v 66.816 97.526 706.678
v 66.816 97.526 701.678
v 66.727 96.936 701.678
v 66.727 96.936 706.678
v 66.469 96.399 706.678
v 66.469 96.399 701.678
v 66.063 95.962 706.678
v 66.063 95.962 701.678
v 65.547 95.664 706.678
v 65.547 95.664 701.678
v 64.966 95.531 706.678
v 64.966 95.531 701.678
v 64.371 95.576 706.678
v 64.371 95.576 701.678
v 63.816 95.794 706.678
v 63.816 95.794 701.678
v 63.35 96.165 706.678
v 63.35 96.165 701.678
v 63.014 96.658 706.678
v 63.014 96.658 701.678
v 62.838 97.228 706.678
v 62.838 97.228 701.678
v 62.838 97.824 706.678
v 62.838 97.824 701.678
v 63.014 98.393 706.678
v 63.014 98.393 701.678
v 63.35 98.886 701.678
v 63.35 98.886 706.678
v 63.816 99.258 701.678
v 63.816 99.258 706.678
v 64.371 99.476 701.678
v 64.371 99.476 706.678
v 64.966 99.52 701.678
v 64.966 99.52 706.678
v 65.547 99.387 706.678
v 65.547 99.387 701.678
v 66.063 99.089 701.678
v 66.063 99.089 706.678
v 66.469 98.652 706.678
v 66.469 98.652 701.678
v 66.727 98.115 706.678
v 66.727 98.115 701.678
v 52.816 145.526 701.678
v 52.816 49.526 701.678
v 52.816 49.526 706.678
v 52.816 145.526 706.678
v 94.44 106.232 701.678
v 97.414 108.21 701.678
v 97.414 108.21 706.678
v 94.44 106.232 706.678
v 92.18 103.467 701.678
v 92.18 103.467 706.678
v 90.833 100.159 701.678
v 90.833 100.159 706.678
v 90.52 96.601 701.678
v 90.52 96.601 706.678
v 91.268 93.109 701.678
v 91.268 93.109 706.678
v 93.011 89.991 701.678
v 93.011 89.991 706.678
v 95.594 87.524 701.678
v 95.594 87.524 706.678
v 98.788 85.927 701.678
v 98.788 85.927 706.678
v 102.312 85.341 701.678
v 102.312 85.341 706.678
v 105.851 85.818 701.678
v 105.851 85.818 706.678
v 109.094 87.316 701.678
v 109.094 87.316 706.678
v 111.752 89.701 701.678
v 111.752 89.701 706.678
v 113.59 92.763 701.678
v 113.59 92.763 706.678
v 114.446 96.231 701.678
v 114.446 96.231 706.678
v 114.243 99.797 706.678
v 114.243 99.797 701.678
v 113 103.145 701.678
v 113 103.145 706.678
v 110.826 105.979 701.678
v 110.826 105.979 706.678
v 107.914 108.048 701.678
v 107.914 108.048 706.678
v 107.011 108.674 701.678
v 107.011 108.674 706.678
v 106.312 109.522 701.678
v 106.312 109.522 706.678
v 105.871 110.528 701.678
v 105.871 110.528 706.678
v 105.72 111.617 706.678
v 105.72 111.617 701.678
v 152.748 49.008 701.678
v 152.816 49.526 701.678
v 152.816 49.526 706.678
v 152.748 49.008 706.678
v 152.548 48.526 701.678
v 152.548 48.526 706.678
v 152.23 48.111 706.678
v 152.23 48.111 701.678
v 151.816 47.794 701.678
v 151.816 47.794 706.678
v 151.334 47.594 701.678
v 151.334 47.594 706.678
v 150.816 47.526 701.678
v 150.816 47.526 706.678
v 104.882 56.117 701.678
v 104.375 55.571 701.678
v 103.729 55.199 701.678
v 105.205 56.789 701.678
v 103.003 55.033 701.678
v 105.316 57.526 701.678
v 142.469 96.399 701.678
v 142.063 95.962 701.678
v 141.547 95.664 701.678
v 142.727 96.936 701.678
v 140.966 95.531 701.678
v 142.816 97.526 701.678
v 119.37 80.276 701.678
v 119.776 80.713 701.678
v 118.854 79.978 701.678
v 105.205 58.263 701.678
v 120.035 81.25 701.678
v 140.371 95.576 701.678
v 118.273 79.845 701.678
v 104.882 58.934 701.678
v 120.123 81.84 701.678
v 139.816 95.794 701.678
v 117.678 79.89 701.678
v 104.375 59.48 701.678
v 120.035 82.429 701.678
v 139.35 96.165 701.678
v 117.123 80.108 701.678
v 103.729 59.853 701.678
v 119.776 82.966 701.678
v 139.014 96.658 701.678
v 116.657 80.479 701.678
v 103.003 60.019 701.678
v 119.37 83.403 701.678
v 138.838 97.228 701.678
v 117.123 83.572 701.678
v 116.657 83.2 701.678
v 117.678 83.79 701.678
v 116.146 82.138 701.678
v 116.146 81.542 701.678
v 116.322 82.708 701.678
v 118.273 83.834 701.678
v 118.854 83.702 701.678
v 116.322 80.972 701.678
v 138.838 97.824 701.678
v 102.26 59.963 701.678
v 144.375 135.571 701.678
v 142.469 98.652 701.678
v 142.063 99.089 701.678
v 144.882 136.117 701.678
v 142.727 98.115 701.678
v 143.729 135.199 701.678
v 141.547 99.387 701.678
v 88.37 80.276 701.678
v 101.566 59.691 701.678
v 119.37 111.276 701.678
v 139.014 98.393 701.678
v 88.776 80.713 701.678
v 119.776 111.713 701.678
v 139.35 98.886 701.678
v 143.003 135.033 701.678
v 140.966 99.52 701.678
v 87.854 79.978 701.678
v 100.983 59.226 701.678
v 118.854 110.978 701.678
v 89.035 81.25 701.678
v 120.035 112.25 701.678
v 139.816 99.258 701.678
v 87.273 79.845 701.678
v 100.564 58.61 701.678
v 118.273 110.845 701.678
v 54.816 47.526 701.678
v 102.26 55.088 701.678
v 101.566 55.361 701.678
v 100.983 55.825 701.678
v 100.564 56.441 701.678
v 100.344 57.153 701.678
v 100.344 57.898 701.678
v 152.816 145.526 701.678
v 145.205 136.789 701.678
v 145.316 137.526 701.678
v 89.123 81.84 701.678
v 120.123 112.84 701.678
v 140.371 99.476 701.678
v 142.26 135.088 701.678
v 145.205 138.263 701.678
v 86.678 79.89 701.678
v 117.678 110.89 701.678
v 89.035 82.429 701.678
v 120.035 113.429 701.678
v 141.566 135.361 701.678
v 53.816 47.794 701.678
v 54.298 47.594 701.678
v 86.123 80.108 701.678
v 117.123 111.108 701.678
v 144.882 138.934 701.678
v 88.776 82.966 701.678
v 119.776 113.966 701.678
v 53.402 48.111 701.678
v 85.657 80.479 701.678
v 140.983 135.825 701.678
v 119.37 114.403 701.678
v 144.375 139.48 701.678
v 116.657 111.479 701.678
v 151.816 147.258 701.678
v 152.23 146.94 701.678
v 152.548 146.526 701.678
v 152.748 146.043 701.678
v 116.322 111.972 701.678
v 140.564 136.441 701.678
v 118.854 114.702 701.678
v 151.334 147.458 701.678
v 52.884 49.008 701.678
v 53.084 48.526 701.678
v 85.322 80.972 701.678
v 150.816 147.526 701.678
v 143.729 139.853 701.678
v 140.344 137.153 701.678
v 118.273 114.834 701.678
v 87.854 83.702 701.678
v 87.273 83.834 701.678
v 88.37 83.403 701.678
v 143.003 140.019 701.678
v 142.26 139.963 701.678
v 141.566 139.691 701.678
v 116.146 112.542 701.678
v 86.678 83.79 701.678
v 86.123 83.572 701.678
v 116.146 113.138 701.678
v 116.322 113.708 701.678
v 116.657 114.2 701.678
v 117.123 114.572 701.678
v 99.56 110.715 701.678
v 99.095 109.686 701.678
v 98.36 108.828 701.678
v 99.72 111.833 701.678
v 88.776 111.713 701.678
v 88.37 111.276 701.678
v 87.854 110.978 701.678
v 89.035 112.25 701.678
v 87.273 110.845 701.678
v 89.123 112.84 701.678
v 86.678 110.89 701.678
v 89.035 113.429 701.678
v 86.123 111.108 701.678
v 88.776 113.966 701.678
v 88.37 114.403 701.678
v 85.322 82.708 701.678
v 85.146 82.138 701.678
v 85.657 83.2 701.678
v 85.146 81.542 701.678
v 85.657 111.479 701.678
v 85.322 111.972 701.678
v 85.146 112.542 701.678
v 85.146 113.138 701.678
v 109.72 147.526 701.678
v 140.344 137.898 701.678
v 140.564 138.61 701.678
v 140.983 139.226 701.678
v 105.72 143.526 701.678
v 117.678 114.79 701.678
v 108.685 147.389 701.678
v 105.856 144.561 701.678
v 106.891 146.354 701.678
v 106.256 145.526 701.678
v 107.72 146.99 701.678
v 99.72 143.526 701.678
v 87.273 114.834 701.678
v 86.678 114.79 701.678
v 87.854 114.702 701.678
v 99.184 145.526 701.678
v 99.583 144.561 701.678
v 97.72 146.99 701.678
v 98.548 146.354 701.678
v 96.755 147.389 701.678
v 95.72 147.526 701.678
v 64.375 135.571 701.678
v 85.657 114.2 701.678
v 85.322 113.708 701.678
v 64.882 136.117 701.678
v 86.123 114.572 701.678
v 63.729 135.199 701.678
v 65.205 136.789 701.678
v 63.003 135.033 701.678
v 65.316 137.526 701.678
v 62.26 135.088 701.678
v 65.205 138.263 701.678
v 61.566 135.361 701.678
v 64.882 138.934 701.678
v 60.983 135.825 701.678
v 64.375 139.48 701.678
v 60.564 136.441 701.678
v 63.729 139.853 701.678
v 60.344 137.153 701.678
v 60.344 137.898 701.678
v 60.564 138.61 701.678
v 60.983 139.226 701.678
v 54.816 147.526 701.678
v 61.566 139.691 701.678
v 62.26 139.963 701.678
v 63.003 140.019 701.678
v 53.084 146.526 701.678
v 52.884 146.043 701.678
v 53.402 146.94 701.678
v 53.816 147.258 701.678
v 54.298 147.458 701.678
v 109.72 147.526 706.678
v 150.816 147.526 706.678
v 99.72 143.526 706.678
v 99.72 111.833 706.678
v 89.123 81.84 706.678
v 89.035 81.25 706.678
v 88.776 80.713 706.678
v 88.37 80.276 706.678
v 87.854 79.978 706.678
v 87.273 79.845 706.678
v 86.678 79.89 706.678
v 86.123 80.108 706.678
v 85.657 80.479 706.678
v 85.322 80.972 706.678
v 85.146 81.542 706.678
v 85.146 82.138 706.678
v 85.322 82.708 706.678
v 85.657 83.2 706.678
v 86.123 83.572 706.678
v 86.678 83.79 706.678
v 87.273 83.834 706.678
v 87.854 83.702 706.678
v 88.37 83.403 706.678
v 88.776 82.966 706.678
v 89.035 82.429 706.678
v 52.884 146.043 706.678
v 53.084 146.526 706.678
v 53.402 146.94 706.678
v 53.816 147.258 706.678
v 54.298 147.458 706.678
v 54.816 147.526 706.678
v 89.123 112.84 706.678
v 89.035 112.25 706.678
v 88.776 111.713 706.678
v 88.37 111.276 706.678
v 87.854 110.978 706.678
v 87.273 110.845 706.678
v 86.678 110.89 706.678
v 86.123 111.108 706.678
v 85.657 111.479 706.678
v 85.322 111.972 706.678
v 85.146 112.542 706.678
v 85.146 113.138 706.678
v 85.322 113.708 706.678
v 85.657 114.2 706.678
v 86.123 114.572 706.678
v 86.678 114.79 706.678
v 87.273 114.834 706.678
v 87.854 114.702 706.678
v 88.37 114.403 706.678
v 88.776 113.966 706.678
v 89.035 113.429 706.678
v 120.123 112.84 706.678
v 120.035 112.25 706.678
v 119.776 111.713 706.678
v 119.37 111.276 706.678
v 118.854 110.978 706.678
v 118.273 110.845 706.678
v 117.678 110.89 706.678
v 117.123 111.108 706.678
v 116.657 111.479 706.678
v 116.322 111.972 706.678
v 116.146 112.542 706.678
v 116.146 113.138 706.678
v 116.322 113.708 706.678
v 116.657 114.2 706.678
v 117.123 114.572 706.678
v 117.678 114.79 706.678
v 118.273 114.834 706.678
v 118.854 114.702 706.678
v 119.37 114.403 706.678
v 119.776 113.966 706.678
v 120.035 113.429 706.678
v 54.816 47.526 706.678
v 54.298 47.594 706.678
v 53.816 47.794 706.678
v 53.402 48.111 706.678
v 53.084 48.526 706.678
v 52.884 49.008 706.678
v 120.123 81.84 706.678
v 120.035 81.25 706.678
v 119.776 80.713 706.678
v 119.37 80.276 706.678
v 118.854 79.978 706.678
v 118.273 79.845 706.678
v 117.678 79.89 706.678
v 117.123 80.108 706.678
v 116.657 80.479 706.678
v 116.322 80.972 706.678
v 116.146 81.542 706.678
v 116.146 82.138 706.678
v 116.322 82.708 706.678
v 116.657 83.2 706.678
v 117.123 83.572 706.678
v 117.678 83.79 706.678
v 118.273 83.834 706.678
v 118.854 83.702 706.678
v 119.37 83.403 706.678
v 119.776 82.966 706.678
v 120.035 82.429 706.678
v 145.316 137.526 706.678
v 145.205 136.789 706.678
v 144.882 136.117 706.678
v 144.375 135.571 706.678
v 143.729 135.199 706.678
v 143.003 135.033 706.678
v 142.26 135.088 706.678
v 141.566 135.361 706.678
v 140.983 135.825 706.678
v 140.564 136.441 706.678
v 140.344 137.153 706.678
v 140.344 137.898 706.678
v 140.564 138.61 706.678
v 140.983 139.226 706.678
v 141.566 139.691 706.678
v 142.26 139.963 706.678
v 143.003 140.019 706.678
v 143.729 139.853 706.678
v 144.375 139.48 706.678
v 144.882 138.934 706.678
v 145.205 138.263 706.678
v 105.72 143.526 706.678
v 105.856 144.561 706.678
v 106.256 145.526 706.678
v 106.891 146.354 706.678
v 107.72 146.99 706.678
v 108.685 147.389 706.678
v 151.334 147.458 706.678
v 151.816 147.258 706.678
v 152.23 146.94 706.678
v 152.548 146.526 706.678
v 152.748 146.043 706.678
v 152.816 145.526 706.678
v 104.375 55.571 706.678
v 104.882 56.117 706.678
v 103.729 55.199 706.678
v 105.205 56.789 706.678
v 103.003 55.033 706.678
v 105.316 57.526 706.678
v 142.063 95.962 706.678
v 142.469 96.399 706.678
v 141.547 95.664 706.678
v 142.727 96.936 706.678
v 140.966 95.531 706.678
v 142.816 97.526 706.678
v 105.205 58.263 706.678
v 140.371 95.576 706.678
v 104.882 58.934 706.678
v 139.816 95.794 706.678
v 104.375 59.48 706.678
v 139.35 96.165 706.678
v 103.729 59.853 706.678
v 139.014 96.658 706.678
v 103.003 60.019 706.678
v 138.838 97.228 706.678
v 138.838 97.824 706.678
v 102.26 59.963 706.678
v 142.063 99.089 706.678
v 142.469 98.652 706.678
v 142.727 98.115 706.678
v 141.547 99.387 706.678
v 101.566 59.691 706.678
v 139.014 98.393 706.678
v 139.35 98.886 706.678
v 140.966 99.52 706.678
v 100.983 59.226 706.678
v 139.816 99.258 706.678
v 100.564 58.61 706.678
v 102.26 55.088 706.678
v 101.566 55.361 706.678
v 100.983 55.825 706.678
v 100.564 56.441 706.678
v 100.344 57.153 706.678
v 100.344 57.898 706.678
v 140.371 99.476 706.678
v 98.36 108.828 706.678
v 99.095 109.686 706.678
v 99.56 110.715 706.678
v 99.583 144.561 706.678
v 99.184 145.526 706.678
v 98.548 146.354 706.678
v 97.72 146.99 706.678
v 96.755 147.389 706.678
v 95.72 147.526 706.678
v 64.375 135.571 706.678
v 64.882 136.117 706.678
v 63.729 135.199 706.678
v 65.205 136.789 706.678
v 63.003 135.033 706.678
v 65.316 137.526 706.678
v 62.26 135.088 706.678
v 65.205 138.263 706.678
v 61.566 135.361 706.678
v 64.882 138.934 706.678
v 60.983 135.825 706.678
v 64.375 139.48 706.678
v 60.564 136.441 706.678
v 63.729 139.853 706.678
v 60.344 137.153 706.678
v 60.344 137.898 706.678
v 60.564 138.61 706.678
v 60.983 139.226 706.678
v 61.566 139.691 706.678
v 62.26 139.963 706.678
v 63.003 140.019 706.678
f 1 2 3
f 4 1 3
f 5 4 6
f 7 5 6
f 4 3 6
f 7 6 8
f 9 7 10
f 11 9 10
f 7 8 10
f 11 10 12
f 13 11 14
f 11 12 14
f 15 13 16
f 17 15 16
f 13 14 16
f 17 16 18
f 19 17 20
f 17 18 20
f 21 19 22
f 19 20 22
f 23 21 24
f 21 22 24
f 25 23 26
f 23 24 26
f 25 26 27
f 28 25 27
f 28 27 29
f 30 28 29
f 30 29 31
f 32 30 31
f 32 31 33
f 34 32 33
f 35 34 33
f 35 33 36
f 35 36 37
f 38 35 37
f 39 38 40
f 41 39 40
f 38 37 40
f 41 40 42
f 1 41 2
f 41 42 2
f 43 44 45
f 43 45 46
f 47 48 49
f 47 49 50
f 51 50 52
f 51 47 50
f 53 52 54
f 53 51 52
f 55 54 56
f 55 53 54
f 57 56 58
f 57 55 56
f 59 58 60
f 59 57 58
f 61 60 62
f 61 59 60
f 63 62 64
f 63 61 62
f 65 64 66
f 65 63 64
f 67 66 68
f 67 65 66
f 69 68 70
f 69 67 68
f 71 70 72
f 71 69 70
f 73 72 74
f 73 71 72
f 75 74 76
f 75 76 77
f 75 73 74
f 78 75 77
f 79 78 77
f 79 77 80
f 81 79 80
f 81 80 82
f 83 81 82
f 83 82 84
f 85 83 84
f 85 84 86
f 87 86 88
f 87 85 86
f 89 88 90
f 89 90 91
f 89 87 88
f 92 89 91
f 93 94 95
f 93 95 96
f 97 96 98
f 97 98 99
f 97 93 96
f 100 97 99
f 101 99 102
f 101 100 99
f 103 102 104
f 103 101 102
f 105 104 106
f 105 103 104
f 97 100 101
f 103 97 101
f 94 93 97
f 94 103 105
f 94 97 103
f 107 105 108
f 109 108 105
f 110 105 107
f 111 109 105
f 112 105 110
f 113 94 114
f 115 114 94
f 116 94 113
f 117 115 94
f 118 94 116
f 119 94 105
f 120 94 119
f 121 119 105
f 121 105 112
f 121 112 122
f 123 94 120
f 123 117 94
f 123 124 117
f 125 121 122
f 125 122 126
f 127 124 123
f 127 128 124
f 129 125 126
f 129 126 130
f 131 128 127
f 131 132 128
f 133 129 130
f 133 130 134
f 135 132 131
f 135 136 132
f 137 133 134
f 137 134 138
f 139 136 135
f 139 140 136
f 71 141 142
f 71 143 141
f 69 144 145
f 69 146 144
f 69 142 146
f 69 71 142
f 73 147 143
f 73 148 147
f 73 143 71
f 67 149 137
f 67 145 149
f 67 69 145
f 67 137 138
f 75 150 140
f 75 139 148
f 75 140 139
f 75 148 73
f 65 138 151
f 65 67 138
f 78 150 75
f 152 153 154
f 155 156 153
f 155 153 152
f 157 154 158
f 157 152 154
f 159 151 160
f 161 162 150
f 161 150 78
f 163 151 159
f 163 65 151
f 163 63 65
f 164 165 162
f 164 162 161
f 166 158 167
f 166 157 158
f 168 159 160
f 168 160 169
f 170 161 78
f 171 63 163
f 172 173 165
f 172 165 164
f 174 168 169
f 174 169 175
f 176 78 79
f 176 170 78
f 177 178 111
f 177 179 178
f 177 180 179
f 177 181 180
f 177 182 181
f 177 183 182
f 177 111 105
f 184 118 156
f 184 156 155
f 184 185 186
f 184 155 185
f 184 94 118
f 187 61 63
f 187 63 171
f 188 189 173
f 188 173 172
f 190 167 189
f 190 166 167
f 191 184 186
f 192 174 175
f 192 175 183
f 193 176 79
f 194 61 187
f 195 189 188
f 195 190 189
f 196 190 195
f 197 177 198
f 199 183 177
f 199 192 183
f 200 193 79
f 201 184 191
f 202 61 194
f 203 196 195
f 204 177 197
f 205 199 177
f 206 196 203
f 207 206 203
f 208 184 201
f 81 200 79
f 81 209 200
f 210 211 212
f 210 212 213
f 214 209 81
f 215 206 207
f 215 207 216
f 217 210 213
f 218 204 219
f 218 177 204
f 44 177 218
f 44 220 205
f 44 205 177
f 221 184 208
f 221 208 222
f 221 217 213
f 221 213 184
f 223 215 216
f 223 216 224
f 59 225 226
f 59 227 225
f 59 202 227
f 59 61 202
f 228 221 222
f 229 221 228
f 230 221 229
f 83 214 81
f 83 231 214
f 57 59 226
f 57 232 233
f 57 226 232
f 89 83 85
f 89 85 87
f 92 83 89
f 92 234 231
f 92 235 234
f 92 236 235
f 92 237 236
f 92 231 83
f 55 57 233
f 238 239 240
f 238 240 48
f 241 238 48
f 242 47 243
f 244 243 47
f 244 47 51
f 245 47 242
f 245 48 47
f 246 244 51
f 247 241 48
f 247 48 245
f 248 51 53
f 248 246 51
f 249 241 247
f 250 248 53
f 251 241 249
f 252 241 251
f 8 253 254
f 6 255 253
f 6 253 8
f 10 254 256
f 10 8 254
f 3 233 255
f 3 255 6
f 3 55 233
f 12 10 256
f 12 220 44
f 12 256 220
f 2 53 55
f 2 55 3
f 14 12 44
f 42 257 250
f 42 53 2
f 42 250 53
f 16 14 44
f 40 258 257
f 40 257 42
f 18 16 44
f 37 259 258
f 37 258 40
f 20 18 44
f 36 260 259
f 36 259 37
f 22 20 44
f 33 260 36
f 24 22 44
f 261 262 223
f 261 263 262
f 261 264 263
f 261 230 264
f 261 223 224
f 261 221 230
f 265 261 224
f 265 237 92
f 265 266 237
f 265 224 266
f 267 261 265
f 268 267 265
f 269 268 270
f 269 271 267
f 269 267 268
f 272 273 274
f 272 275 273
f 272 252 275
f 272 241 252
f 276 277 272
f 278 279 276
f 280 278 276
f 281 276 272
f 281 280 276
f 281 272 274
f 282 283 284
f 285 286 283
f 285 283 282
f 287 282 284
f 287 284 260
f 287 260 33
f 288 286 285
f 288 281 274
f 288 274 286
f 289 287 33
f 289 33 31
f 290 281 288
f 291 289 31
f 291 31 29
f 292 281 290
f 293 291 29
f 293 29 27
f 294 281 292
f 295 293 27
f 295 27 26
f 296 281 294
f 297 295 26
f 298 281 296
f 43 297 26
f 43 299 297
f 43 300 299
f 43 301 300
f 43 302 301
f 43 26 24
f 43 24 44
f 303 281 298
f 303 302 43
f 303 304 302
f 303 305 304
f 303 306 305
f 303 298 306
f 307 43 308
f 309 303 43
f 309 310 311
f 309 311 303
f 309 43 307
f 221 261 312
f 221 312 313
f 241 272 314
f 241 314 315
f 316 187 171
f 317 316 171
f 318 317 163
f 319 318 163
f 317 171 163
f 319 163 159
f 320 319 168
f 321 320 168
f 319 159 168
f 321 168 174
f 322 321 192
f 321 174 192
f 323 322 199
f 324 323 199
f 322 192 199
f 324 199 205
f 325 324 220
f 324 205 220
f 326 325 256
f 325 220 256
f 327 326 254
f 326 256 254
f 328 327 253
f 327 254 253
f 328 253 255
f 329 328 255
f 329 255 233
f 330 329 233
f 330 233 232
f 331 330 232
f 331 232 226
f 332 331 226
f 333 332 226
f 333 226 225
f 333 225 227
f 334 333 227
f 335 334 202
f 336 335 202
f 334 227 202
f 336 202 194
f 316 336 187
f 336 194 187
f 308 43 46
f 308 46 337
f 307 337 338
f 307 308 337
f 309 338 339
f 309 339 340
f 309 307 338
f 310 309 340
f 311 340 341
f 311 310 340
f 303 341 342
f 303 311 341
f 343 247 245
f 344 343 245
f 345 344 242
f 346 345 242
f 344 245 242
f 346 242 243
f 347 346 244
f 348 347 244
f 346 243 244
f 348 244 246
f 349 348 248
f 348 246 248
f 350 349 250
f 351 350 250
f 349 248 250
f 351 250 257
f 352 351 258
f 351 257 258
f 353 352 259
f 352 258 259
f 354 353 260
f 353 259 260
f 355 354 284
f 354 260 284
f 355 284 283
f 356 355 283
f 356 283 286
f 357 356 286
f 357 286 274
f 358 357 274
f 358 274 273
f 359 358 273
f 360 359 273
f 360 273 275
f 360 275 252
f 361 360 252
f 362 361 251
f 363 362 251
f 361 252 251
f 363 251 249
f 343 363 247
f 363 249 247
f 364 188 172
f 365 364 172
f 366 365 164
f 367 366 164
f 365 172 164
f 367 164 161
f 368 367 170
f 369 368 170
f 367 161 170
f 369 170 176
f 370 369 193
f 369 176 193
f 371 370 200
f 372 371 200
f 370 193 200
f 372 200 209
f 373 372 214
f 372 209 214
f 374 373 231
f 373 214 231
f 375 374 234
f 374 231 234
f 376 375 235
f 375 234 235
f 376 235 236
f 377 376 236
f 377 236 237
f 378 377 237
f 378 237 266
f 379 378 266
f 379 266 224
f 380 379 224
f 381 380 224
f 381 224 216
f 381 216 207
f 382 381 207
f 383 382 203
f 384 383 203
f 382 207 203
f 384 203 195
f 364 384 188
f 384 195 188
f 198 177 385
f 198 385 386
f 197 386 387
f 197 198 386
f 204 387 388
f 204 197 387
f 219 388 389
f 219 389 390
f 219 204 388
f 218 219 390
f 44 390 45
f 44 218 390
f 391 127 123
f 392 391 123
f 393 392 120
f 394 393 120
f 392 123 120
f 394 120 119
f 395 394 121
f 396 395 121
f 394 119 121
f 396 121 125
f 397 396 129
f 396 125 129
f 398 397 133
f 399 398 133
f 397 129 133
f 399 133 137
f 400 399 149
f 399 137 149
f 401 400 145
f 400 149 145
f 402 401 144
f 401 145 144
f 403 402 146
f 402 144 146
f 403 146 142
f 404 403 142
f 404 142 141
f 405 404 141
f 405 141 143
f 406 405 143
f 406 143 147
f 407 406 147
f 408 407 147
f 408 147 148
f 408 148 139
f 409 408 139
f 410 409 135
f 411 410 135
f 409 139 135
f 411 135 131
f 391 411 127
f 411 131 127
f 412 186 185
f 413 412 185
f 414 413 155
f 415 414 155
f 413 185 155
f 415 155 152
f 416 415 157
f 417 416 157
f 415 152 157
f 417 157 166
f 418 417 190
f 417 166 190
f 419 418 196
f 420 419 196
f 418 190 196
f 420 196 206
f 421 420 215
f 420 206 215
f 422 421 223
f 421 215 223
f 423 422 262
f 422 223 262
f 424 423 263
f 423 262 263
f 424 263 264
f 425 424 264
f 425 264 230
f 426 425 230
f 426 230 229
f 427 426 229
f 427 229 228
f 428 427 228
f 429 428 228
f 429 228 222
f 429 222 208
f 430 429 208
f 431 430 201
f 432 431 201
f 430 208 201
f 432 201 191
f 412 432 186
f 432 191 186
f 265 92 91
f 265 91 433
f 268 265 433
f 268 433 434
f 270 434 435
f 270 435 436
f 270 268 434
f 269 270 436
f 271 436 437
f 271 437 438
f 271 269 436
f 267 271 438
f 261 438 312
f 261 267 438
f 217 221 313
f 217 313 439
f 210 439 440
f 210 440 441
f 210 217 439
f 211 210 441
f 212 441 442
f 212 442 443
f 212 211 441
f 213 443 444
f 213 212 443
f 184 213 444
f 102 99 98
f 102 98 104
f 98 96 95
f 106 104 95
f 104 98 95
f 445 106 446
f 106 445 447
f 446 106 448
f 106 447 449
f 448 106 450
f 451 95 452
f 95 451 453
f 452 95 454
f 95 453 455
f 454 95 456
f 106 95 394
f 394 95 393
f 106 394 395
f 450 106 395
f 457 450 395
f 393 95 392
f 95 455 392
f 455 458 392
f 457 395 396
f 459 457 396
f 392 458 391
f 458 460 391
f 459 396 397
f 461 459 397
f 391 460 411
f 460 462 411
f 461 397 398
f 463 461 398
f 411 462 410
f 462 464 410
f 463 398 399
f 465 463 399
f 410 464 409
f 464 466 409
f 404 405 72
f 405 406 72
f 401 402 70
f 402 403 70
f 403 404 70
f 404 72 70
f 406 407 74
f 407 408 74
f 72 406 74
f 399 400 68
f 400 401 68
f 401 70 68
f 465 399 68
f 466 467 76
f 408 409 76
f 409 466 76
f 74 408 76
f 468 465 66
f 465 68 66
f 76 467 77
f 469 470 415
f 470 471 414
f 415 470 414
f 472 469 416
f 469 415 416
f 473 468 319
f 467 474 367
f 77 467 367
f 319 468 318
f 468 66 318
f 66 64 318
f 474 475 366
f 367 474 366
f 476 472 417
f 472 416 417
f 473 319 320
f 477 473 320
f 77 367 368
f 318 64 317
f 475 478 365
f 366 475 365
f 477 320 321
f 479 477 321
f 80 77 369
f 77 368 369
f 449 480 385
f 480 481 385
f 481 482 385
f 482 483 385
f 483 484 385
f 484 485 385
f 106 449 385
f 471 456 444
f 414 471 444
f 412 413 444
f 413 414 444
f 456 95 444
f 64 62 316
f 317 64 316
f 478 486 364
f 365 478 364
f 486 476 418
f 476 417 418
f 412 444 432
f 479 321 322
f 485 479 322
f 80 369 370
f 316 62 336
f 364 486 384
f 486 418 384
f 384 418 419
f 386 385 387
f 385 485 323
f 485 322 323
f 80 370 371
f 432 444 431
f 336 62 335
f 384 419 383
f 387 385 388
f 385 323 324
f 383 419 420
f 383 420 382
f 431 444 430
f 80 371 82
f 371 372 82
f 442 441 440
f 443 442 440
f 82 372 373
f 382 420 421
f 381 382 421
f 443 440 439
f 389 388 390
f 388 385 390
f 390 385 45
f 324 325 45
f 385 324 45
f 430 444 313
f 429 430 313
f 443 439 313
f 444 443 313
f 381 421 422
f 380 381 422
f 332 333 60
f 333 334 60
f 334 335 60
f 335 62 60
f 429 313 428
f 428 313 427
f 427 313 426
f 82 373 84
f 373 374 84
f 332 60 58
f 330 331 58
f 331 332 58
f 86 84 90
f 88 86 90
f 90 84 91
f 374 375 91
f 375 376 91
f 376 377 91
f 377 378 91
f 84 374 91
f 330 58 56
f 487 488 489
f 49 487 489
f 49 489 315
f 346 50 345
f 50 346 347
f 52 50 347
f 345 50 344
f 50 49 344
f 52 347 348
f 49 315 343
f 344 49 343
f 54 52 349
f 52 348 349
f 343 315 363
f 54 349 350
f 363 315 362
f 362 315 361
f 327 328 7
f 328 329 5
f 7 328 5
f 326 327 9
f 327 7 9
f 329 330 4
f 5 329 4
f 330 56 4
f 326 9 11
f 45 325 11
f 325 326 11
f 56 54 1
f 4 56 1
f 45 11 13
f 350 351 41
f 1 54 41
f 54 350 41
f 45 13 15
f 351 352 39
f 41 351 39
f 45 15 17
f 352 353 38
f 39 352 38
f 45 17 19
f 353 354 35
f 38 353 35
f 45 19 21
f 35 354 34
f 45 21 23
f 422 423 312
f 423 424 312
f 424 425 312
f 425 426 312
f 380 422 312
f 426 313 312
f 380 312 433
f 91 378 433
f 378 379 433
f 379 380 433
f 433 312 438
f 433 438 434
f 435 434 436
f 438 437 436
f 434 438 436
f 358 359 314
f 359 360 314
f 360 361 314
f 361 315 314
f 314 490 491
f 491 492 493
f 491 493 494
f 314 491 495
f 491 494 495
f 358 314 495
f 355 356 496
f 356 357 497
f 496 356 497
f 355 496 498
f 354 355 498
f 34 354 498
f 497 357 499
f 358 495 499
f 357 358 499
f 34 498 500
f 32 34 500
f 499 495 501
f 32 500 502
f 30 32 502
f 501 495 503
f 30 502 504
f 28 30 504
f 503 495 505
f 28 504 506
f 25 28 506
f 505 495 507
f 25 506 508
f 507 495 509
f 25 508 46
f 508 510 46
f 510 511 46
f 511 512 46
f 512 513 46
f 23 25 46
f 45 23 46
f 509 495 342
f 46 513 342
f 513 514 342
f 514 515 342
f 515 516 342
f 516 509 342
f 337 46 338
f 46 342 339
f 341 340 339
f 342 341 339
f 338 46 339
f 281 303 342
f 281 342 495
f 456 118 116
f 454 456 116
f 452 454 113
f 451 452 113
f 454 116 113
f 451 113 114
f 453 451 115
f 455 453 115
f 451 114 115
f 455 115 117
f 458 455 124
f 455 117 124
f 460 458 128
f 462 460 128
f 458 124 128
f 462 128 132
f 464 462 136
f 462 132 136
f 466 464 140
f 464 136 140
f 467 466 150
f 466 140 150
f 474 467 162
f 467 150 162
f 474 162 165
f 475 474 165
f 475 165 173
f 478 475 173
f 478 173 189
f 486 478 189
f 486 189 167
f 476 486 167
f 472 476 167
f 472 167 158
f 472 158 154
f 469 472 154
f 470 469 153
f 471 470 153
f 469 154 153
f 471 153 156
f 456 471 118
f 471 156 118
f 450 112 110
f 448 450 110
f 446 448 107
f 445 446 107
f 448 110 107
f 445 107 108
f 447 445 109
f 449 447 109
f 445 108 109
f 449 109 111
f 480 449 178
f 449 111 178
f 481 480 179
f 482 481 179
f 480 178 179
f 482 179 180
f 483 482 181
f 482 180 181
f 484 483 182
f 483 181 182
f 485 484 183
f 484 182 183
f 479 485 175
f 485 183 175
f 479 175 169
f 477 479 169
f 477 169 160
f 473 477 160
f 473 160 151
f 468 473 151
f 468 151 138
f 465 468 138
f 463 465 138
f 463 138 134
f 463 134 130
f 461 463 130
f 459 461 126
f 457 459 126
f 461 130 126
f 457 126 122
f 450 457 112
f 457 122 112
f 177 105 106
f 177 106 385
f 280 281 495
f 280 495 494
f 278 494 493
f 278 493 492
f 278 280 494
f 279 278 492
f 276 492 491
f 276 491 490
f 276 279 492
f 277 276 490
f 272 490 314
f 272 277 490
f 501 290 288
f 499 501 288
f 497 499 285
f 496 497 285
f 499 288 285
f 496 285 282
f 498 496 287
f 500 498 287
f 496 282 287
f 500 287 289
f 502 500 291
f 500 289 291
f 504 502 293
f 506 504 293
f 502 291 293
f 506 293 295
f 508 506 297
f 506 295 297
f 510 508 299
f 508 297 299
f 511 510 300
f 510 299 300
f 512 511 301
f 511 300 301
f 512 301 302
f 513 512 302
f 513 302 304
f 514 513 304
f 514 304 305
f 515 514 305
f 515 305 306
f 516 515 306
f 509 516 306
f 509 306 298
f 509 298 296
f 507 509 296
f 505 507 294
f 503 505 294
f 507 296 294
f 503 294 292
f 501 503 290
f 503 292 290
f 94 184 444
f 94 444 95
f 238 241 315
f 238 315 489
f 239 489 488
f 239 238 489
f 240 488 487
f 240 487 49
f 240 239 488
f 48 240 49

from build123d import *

# Parameters (mm, degrees)
SKETCH1_R           = 2
SKETCH1_R_2         = 2.5
BOSS_EXTRUDE1_DEPTH = 5


with BuildPart() as part:
    # Sketch1 → Boss-Extrude1 (new body)
    with BuildSketch(Plane(origin=(0, 0, 701.677889561), x_dir=(-1, 0, 0), z_dir=(0, 0, -1))):
        with BuildLine():
            Line((-99.719780497, 143.525710146), (-99.719780497, 111.833409744))
            ThreePointArc((-99.719780497, 111.833409744), (-99.09450302, 109.686028108), (-97.41415655, 108.210001157))
            ThreePointArc((-97.41415655, 108.210001157), (-102.311705141, 85.341210472), (-107.91415655, 108.047599613))
            ThreePointArc((-107.91415655, 108.047599613), (-106.312252376, 109.521939482), (-105.719780497, 111.616874352))
            Line((-105.719780497, 111.616874352), (-105.719780497, 143.525710146))
            ThreePointArc((-105.719780497, 143.525710146), (-106.891353372, 146.354137271), (-109.719780497, 147.525710146))
            Line((-109.719780497, 147.525710146), (-150.816081745, 147.525710146))
            ThreePointArc((-150.816081745, 147.525710146), (-152.230295307, 146.939923708), (-152.816081745, 145.525710146))
            Line((-152.816081745, 145.525710146), (-152.816081745, 49.525710146))
            ThreePointArc((-152.816081745, 49.525710146), (-152.230295307, 48.111496583), (-150.816081745, 47.525710146))
            Line((-150.816081745, 47.525710146), (-54.816081745, 47.525710146))
            ThreePointArc((-54.816081745, 47.525710146), (-53.401868182, 48.111496583), (-52.816081745, 49.525710146))
            Line((-52.816081745, 49.525710146), (-52.816081745, 145.525710146))
            ThreePointArc((-52.816081745, 145.525710146), (-53.401868182, 146.939923708), (-54.816081745, 147.525710146))
            Line((-54.816081745, 147.525710146), (-95.719780497, 147.525710146))
            ThreePointArc((-95.719780497, 147.525710146), (-98.548207622, 146.354137271), (-99.719780497, 143.525710146))
        make_face()
        with Locations(Location((-87.123479249, 81.839775395, 0), (0, 0, 180))):
            Circle(SKETCH1_R, mode=Mode.SUBTRACT)
        with Locations(Location((-118.123479249, 81.839775395, 0), (0, 0, 180))):
            Circle(SKETCH1_R, mode=Mode.SUBTRACT)
        with Locations(Location((-87.123479249, 112.839775395, 0), (0, 0, 180))):
            Circle(SKETCH1_R, mode=Mode.SUBTRACT)
        with Locations(Location((-118.123479249, 112.839775395, 0), (0, 0, 180))):
            Circle(SKETCH1_R, mode=Mode.SUBTRACT)
        with Locations(Location((-102.816081745, 57.525710146, 0), (0, 0, 180))):
            Circle(SKETCH1_R_2, mode=Mode.SUBTRACT)
        with Locations(Location((-62.816081745, 137.525710146, 0), (0, 0, 180))):
            Circle(SKETCH1_R_2, mode=Mode.SUBTRACT)
        with Locations(Location((-142.816081745, 137.525710146, 0), (0, 0, 180))):
            Circle(SKETCH1_R_2, mode=Mode.SUBTRACT)
        with Locations(Location((-64.816081745, 97.525710146, 0), (0, 0, 180))):
            Circle(SKETCH1_R, mode=Mode.SUBTRACT)
        with Locations(Location((-140.816081745, 97.525710146, 0), (0, 0, 180))):
            Circle(SKETCH1_R, mode=Mode.SUBTRACT)
    extrude(amount=-BOSS_EXTRUDE1_DEPTH)


solid = part.part
